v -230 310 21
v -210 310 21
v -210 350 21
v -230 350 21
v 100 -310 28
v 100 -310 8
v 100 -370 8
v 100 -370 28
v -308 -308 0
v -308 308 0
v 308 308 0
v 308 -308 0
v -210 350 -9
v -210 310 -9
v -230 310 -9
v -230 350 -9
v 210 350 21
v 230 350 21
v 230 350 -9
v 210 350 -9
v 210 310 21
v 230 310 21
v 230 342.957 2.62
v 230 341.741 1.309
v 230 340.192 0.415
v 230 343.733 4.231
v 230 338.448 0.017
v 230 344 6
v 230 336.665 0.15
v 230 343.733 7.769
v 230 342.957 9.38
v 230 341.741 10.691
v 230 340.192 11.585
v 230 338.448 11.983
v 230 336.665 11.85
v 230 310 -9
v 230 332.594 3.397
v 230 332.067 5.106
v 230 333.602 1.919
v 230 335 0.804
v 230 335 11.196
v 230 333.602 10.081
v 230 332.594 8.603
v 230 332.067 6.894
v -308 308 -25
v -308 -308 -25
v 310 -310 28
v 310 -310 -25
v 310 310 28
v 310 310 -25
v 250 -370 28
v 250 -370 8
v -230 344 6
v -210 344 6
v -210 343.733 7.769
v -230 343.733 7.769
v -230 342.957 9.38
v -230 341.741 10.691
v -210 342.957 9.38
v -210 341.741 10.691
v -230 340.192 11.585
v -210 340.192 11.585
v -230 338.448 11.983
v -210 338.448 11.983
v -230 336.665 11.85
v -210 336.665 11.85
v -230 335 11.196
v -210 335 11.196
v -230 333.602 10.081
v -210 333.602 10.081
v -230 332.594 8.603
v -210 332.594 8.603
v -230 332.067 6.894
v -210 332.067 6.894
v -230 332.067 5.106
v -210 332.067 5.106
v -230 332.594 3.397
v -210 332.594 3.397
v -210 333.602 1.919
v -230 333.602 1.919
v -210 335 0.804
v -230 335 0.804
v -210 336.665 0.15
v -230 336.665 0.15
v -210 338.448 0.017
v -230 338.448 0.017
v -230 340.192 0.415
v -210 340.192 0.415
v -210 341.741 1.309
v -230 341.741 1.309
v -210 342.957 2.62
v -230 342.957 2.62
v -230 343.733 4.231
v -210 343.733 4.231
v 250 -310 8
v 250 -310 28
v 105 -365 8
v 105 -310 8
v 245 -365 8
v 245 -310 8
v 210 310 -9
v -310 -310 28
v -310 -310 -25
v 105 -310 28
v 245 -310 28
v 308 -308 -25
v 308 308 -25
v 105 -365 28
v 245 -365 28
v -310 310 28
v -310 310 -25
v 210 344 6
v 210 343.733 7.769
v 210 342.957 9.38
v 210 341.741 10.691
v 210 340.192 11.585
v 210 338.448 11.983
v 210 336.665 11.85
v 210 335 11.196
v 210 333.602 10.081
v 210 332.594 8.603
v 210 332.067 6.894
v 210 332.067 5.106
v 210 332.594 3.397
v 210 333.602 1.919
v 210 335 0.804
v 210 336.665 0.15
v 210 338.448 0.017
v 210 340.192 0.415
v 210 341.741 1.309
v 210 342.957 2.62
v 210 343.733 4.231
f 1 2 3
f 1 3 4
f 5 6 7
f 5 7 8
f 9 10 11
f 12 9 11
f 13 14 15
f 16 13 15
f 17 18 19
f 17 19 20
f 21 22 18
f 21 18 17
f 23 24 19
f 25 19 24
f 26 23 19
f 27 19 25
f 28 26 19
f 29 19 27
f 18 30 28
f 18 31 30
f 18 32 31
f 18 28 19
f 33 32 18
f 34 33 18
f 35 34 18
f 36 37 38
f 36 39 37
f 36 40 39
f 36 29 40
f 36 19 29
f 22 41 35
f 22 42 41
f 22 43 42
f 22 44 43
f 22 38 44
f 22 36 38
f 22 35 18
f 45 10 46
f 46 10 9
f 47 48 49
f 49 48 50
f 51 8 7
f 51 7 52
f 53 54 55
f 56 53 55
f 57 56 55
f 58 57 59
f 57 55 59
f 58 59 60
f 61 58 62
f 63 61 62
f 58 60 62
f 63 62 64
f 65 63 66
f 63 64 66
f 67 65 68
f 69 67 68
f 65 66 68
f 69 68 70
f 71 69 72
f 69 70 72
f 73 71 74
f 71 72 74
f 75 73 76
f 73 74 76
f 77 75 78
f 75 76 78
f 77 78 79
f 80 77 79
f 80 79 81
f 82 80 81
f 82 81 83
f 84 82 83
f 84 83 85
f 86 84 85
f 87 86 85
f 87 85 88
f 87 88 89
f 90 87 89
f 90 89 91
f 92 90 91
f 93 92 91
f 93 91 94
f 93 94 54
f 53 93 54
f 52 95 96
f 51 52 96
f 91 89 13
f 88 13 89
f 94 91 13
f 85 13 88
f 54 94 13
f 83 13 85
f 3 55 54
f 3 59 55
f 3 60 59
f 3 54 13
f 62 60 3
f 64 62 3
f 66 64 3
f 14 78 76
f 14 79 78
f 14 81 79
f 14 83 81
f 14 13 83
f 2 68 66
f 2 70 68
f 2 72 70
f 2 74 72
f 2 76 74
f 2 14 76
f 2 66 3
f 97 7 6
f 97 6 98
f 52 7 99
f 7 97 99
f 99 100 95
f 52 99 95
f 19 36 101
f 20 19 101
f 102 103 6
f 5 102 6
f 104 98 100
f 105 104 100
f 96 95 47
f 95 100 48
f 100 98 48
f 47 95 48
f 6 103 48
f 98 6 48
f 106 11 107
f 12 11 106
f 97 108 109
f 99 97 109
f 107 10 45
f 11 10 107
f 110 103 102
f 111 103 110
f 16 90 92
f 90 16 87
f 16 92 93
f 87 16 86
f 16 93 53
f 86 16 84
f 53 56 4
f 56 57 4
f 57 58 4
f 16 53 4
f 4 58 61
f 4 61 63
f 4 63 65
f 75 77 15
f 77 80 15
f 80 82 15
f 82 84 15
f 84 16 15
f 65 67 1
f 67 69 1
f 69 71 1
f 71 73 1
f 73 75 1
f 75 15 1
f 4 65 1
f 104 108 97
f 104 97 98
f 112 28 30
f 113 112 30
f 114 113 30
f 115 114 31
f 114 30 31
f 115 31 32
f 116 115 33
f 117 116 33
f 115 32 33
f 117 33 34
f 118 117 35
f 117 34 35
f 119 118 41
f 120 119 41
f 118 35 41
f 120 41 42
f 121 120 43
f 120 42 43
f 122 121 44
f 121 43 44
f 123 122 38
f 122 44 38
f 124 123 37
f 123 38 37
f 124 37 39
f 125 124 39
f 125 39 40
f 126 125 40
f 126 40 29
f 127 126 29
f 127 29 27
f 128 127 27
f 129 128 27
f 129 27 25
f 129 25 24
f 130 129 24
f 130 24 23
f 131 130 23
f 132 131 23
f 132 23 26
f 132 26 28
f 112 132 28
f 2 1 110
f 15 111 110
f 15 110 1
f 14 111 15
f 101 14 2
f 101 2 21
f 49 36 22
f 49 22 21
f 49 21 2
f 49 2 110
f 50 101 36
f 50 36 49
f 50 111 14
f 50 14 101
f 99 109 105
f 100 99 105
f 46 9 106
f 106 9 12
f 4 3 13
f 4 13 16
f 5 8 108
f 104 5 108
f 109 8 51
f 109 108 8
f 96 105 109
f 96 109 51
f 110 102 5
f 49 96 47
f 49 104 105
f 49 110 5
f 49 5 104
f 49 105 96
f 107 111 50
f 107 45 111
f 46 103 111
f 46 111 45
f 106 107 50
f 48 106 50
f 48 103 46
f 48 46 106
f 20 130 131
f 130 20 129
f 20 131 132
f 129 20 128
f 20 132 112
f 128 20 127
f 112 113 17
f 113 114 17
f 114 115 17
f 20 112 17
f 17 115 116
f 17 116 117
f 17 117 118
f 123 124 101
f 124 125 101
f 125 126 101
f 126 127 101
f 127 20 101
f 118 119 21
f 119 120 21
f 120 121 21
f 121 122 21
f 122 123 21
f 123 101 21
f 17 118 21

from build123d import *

# Parameters (mm, degrees)
F0_W      = 620
F0_H      = 620
F1_DEPTH  = 3
F2_W      = 620
F2_H      = 620
F2_W_2    = 616
F2_H_2    = 616
F3_DEPTH  = 25
F4_DEPTH  = 25
F5_W      = 150
F5_H      = 20
F6_DEPTH  = 60
F7_W      = 140
F7_H      = 55
F8_DEPTH  = 25
F9_W      = 20
F9_H      = 30
F10_DEPTH = 40
F11_R     = 6
F12_DEPTH = 540.001


with BuildPart() as f1:
    # F0 (on Top) → F1 (new body)
    with BuildSketch(Plane.XY):
        Rectangle(F0_W, F0_H)
    extrude(amount=F1_DEPTH)

    # F2 (on face) → F3 (join)
    with BuildSketch(Plane(origin=(0, 0, 0), x_dir=(1, 0, 0), z_dir=(0, 0, -1))):
        Rectangle(F2_W, F2_H)
        Rectangle(F2_W_2, F2_H_2, mode=Mode.SUBTRACT)
    extrude(amount=F3_DEPTH)

    # F4 (add): a face of the model
    f4_faces = [f1.faces().sort_by_distance(p)[0] for p in [
        (0, 0, 3),
    ]]
    extrude(f4_faces, amount=F4_DEPTH)

    # F5 (on face) → F6 (join)
    with BuildSketch(Plane.XZ.offset(310)):
        with Locations((175, 18)):
            Rectangle(F5_W, F5_H)
    extrude(amount=F6_DEPTH)

    # F7 (on face) → F8 (cut)
    with BuildSketch(Plane.XY.offset(28)):
        with Locations((175, -337.5)):
            Rectangle(F7_W, F7_H)
    extrude(amount=-F8_DEPTH, mode=Mode.SUBTRACT)

    # F9 (on face) → F10 (join)
    with BuildSketch(Plane(origin=(0, 310, 0), x_dir=(-1, 0, 0), z_dir=(0, 1, 0))):
        with Locations((220, 6)):
            Rectangle(F9_W, F9_H)
        with Locations((-220, 6)):
            Rectangle(F9_W, F9_H)
    extrude(amount=F10_DEPTH)

    # F11 (on face) → F12 (cut, through all)
    with BuildSketch(Plane.YZ.offset(230)):
        with Locations((338, 6)):
            Circle(F11_R)
    extrude(amount=-F12_DEPTH, mode=Mode.SUBTRACT)


solid = f1.part
